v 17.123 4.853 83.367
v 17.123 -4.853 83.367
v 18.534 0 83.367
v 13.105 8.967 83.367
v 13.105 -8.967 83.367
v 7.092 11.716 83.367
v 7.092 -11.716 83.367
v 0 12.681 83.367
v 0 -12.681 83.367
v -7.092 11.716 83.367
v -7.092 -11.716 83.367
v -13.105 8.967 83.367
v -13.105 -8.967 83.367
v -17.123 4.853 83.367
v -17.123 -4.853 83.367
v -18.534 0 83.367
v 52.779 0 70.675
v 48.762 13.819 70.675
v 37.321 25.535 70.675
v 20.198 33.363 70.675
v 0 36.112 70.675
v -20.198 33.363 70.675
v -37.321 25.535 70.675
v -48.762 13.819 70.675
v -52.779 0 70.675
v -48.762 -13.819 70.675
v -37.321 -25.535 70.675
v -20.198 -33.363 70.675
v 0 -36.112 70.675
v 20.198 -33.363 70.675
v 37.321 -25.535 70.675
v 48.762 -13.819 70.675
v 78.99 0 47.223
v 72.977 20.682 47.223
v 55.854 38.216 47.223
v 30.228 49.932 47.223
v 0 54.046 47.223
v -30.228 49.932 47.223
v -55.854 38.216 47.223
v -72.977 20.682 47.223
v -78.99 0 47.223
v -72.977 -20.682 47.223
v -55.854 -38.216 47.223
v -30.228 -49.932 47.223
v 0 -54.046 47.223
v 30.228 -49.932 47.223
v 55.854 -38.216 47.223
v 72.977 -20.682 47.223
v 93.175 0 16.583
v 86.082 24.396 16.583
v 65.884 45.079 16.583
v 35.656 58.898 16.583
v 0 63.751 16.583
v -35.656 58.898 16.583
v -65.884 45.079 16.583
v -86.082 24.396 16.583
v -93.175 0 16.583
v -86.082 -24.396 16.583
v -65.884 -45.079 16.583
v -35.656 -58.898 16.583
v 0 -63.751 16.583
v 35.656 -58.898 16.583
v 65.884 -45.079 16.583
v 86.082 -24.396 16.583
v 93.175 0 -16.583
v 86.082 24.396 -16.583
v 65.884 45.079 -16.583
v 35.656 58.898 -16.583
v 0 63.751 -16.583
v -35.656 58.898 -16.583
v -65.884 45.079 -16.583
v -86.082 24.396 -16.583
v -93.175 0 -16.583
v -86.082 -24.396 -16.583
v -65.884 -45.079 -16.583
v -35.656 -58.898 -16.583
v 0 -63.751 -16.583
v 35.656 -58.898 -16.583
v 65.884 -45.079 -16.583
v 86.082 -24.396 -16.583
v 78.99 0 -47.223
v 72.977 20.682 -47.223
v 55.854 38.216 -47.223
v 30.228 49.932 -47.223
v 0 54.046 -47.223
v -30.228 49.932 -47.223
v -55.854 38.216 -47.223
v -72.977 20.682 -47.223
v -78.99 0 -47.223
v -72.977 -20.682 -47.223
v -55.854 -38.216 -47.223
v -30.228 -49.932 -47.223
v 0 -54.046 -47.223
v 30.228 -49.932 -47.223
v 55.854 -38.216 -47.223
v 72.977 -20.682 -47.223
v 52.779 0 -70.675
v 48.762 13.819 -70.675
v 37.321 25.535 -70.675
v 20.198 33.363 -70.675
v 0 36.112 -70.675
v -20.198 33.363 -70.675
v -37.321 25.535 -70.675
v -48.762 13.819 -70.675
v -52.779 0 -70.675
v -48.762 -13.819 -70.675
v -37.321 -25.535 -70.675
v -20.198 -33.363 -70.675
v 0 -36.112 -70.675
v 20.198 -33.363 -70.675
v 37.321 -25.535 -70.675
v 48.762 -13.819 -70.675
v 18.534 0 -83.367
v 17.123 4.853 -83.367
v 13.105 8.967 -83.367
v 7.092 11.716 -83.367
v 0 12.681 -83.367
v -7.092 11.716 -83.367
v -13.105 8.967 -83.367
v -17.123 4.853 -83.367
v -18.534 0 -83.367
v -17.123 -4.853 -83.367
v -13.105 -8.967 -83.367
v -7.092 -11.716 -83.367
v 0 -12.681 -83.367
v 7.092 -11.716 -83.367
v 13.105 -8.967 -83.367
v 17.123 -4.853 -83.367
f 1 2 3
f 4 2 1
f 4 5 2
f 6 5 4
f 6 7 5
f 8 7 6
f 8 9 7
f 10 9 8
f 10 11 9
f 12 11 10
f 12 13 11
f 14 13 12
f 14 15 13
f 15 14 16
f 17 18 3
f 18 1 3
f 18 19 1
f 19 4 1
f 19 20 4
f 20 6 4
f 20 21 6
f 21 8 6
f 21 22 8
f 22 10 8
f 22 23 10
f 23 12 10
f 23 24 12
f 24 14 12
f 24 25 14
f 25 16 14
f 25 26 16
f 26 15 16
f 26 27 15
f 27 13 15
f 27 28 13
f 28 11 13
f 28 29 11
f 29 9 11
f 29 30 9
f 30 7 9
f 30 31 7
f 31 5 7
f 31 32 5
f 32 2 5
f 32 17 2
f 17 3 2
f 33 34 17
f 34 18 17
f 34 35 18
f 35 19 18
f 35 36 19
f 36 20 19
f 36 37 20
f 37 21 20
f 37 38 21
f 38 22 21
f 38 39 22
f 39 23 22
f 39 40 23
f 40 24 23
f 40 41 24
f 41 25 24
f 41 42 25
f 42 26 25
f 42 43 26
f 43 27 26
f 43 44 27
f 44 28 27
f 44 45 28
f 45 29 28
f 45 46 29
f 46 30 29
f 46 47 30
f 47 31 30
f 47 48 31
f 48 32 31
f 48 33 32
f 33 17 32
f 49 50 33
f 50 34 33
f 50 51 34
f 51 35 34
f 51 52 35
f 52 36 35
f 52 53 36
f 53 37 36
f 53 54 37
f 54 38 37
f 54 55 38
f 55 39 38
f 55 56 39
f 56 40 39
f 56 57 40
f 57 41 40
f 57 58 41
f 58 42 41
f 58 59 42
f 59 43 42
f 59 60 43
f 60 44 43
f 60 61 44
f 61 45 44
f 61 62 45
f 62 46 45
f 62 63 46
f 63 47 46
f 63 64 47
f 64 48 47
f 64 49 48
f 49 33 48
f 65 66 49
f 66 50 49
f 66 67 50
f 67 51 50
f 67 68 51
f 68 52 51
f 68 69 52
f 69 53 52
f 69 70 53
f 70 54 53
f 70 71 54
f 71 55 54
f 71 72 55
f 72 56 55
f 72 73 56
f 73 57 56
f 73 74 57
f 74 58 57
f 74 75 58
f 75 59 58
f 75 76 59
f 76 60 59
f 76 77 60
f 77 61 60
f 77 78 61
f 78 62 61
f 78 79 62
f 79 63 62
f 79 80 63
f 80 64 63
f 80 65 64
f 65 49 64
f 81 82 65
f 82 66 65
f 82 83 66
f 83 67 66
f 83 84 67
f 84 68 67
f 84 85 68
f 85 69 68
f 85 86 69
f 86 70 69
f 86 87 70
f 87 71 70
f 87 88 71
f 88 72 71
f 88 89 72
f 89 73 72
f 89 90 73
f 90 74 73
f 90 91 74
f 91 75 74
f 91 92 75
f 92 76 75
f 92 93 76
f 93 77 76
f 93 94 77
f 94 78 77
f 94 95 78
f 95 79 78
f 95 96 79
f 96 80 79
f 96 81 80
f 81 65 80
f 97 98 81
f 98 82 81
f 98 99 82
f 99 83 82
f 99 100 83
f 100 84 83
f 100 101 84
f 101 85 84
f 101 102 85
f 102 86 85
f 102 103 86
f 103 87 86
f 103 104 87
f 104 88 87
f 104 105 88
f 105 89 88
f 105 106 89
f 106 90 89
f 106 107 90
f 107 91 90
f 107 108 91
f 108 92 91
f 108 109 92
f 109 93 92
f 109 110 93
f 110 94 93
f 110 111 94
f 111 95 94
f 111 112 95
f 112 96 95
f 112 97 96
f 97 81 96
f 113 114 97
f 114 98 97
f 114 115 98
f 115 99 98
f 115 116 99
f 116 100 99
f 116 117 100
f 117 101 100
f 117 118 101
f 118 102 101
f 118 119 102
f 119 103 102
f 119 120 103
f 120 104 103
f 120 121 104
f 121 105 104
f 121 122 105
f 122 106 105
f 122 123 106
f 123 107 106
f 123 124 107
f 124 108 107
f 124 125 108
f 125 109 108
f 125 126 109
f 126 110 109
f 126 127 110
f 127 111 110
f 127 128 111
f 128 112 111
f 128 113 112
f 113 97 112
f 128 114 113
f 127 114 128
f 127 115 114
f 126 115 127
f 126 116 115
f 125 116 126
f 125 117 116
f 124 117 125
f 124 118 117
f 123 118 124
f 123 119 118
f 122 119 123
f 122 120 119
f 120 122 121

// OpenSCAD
// Generated by SolidPython 1.0.1 on 2020-07-29 00:46:54


scale(v = [19, 13, 17]) {
	sphere(r = 5);
}
/***********************************************
*********      SolidPython code:      **********
************************************************
 
# import packages: SolidPython
from solid import *
from solid.utils import *
from itertools import chain, combinations, permutations


class Resize:

    def __init__(self, scad_file):
        self.scad_file = scad_file
        #self.scad_file = import_scad(scad_file)
        # cone/cylinder param:
        self.r1 = 0
        self.r2 = 0
        self.h = 0
        # rectangular prism param:
        self.w = 0
        self.l = 0
        # ellipse param:
        self.r = 0

    # import OpenScad code (file name corresponds to shape)


    # classify shape + parameters
    def assign(self, param1, param2, param3):
        if self.scad_file == 'cone.scad':
            self.r1 = param1
            self.r2 = param2
            self.h = param3
        elif self.scad_file == 'cylinder.scad':
            self.r1 = param1
            self.r2 = param2
            self.h = param3
        elif self.scad_file == 'rectangularPrism.scad':
            self.h = param1
            self.l = param2
            self.w = param3
        else:
            self.r = param1
            self.h = param2

    # resize parameters
    def iterate(self):
        x = range(3, 20, 2)
        i = 1
        if self.scad_file == 'cone.scad':
            tempList = list(permutations(x, 2))
            for temp in tempList:
                param1 = temp[0]
                param2 = temp[1]
                filepath = 'produced_scad_files/' + 'cone' + str(param1) + '_' + str(param2) + '_' + '.scad'
                scad_render_to_file(cylinder(h=param1, r1=param2, r2=0), filepath)

        elif self.scad_file == 'cylinder.scad':
            tempList = list(permutations(x, 3))
            for temp in tempList:
                param1 = temp[0]
                param2 = temp[1]
                filepath = 'produced_scad_files/' + 'cylinder' + str(param1) + '_' + str(param2) + '_' + '.scad'
                scad_render_to_file(cylinder(h=param1, r1=param2, r2=param2), filepath)

        elif self.scad_file == 'rectangularPrism.scad':
            tempList = list(permutations(x, 3))
            for temp in tempList:
                param1 = temp[0]
                param2 = temp[1]
                param3 = temp[2]
                filepath = 'produced_scad_files/' + 'rectangularPrism' + str(param1) + '_' + str(param2) + '_' + str(
                    param3) + '.scad'
                scad_render_to_file(cube(size=(param1, param2, param3)), filepath)

        elif self.scad_file == 'ellipse.scad':
            tempList = list(permutations(x, 4))
            for temp in tempList:
                param1 = temp[0]
                param2 = temp[1]
                param3 = temp[2]
                param4 = temp[3]
                filepath = 'produced_scad_files/' + 'ellipse' + str(param1) + '_' + str(param2) + '_' + str(param3) + '_' + str(param4) + '.scad'
                scad_render_to_file(scale([param1, param2, param3])(sphere(r=param4)), filepath)

    def render_to_scadfile(self):
        scad_render_to_file(scad, 'example.scad') 
 
************************************************/
